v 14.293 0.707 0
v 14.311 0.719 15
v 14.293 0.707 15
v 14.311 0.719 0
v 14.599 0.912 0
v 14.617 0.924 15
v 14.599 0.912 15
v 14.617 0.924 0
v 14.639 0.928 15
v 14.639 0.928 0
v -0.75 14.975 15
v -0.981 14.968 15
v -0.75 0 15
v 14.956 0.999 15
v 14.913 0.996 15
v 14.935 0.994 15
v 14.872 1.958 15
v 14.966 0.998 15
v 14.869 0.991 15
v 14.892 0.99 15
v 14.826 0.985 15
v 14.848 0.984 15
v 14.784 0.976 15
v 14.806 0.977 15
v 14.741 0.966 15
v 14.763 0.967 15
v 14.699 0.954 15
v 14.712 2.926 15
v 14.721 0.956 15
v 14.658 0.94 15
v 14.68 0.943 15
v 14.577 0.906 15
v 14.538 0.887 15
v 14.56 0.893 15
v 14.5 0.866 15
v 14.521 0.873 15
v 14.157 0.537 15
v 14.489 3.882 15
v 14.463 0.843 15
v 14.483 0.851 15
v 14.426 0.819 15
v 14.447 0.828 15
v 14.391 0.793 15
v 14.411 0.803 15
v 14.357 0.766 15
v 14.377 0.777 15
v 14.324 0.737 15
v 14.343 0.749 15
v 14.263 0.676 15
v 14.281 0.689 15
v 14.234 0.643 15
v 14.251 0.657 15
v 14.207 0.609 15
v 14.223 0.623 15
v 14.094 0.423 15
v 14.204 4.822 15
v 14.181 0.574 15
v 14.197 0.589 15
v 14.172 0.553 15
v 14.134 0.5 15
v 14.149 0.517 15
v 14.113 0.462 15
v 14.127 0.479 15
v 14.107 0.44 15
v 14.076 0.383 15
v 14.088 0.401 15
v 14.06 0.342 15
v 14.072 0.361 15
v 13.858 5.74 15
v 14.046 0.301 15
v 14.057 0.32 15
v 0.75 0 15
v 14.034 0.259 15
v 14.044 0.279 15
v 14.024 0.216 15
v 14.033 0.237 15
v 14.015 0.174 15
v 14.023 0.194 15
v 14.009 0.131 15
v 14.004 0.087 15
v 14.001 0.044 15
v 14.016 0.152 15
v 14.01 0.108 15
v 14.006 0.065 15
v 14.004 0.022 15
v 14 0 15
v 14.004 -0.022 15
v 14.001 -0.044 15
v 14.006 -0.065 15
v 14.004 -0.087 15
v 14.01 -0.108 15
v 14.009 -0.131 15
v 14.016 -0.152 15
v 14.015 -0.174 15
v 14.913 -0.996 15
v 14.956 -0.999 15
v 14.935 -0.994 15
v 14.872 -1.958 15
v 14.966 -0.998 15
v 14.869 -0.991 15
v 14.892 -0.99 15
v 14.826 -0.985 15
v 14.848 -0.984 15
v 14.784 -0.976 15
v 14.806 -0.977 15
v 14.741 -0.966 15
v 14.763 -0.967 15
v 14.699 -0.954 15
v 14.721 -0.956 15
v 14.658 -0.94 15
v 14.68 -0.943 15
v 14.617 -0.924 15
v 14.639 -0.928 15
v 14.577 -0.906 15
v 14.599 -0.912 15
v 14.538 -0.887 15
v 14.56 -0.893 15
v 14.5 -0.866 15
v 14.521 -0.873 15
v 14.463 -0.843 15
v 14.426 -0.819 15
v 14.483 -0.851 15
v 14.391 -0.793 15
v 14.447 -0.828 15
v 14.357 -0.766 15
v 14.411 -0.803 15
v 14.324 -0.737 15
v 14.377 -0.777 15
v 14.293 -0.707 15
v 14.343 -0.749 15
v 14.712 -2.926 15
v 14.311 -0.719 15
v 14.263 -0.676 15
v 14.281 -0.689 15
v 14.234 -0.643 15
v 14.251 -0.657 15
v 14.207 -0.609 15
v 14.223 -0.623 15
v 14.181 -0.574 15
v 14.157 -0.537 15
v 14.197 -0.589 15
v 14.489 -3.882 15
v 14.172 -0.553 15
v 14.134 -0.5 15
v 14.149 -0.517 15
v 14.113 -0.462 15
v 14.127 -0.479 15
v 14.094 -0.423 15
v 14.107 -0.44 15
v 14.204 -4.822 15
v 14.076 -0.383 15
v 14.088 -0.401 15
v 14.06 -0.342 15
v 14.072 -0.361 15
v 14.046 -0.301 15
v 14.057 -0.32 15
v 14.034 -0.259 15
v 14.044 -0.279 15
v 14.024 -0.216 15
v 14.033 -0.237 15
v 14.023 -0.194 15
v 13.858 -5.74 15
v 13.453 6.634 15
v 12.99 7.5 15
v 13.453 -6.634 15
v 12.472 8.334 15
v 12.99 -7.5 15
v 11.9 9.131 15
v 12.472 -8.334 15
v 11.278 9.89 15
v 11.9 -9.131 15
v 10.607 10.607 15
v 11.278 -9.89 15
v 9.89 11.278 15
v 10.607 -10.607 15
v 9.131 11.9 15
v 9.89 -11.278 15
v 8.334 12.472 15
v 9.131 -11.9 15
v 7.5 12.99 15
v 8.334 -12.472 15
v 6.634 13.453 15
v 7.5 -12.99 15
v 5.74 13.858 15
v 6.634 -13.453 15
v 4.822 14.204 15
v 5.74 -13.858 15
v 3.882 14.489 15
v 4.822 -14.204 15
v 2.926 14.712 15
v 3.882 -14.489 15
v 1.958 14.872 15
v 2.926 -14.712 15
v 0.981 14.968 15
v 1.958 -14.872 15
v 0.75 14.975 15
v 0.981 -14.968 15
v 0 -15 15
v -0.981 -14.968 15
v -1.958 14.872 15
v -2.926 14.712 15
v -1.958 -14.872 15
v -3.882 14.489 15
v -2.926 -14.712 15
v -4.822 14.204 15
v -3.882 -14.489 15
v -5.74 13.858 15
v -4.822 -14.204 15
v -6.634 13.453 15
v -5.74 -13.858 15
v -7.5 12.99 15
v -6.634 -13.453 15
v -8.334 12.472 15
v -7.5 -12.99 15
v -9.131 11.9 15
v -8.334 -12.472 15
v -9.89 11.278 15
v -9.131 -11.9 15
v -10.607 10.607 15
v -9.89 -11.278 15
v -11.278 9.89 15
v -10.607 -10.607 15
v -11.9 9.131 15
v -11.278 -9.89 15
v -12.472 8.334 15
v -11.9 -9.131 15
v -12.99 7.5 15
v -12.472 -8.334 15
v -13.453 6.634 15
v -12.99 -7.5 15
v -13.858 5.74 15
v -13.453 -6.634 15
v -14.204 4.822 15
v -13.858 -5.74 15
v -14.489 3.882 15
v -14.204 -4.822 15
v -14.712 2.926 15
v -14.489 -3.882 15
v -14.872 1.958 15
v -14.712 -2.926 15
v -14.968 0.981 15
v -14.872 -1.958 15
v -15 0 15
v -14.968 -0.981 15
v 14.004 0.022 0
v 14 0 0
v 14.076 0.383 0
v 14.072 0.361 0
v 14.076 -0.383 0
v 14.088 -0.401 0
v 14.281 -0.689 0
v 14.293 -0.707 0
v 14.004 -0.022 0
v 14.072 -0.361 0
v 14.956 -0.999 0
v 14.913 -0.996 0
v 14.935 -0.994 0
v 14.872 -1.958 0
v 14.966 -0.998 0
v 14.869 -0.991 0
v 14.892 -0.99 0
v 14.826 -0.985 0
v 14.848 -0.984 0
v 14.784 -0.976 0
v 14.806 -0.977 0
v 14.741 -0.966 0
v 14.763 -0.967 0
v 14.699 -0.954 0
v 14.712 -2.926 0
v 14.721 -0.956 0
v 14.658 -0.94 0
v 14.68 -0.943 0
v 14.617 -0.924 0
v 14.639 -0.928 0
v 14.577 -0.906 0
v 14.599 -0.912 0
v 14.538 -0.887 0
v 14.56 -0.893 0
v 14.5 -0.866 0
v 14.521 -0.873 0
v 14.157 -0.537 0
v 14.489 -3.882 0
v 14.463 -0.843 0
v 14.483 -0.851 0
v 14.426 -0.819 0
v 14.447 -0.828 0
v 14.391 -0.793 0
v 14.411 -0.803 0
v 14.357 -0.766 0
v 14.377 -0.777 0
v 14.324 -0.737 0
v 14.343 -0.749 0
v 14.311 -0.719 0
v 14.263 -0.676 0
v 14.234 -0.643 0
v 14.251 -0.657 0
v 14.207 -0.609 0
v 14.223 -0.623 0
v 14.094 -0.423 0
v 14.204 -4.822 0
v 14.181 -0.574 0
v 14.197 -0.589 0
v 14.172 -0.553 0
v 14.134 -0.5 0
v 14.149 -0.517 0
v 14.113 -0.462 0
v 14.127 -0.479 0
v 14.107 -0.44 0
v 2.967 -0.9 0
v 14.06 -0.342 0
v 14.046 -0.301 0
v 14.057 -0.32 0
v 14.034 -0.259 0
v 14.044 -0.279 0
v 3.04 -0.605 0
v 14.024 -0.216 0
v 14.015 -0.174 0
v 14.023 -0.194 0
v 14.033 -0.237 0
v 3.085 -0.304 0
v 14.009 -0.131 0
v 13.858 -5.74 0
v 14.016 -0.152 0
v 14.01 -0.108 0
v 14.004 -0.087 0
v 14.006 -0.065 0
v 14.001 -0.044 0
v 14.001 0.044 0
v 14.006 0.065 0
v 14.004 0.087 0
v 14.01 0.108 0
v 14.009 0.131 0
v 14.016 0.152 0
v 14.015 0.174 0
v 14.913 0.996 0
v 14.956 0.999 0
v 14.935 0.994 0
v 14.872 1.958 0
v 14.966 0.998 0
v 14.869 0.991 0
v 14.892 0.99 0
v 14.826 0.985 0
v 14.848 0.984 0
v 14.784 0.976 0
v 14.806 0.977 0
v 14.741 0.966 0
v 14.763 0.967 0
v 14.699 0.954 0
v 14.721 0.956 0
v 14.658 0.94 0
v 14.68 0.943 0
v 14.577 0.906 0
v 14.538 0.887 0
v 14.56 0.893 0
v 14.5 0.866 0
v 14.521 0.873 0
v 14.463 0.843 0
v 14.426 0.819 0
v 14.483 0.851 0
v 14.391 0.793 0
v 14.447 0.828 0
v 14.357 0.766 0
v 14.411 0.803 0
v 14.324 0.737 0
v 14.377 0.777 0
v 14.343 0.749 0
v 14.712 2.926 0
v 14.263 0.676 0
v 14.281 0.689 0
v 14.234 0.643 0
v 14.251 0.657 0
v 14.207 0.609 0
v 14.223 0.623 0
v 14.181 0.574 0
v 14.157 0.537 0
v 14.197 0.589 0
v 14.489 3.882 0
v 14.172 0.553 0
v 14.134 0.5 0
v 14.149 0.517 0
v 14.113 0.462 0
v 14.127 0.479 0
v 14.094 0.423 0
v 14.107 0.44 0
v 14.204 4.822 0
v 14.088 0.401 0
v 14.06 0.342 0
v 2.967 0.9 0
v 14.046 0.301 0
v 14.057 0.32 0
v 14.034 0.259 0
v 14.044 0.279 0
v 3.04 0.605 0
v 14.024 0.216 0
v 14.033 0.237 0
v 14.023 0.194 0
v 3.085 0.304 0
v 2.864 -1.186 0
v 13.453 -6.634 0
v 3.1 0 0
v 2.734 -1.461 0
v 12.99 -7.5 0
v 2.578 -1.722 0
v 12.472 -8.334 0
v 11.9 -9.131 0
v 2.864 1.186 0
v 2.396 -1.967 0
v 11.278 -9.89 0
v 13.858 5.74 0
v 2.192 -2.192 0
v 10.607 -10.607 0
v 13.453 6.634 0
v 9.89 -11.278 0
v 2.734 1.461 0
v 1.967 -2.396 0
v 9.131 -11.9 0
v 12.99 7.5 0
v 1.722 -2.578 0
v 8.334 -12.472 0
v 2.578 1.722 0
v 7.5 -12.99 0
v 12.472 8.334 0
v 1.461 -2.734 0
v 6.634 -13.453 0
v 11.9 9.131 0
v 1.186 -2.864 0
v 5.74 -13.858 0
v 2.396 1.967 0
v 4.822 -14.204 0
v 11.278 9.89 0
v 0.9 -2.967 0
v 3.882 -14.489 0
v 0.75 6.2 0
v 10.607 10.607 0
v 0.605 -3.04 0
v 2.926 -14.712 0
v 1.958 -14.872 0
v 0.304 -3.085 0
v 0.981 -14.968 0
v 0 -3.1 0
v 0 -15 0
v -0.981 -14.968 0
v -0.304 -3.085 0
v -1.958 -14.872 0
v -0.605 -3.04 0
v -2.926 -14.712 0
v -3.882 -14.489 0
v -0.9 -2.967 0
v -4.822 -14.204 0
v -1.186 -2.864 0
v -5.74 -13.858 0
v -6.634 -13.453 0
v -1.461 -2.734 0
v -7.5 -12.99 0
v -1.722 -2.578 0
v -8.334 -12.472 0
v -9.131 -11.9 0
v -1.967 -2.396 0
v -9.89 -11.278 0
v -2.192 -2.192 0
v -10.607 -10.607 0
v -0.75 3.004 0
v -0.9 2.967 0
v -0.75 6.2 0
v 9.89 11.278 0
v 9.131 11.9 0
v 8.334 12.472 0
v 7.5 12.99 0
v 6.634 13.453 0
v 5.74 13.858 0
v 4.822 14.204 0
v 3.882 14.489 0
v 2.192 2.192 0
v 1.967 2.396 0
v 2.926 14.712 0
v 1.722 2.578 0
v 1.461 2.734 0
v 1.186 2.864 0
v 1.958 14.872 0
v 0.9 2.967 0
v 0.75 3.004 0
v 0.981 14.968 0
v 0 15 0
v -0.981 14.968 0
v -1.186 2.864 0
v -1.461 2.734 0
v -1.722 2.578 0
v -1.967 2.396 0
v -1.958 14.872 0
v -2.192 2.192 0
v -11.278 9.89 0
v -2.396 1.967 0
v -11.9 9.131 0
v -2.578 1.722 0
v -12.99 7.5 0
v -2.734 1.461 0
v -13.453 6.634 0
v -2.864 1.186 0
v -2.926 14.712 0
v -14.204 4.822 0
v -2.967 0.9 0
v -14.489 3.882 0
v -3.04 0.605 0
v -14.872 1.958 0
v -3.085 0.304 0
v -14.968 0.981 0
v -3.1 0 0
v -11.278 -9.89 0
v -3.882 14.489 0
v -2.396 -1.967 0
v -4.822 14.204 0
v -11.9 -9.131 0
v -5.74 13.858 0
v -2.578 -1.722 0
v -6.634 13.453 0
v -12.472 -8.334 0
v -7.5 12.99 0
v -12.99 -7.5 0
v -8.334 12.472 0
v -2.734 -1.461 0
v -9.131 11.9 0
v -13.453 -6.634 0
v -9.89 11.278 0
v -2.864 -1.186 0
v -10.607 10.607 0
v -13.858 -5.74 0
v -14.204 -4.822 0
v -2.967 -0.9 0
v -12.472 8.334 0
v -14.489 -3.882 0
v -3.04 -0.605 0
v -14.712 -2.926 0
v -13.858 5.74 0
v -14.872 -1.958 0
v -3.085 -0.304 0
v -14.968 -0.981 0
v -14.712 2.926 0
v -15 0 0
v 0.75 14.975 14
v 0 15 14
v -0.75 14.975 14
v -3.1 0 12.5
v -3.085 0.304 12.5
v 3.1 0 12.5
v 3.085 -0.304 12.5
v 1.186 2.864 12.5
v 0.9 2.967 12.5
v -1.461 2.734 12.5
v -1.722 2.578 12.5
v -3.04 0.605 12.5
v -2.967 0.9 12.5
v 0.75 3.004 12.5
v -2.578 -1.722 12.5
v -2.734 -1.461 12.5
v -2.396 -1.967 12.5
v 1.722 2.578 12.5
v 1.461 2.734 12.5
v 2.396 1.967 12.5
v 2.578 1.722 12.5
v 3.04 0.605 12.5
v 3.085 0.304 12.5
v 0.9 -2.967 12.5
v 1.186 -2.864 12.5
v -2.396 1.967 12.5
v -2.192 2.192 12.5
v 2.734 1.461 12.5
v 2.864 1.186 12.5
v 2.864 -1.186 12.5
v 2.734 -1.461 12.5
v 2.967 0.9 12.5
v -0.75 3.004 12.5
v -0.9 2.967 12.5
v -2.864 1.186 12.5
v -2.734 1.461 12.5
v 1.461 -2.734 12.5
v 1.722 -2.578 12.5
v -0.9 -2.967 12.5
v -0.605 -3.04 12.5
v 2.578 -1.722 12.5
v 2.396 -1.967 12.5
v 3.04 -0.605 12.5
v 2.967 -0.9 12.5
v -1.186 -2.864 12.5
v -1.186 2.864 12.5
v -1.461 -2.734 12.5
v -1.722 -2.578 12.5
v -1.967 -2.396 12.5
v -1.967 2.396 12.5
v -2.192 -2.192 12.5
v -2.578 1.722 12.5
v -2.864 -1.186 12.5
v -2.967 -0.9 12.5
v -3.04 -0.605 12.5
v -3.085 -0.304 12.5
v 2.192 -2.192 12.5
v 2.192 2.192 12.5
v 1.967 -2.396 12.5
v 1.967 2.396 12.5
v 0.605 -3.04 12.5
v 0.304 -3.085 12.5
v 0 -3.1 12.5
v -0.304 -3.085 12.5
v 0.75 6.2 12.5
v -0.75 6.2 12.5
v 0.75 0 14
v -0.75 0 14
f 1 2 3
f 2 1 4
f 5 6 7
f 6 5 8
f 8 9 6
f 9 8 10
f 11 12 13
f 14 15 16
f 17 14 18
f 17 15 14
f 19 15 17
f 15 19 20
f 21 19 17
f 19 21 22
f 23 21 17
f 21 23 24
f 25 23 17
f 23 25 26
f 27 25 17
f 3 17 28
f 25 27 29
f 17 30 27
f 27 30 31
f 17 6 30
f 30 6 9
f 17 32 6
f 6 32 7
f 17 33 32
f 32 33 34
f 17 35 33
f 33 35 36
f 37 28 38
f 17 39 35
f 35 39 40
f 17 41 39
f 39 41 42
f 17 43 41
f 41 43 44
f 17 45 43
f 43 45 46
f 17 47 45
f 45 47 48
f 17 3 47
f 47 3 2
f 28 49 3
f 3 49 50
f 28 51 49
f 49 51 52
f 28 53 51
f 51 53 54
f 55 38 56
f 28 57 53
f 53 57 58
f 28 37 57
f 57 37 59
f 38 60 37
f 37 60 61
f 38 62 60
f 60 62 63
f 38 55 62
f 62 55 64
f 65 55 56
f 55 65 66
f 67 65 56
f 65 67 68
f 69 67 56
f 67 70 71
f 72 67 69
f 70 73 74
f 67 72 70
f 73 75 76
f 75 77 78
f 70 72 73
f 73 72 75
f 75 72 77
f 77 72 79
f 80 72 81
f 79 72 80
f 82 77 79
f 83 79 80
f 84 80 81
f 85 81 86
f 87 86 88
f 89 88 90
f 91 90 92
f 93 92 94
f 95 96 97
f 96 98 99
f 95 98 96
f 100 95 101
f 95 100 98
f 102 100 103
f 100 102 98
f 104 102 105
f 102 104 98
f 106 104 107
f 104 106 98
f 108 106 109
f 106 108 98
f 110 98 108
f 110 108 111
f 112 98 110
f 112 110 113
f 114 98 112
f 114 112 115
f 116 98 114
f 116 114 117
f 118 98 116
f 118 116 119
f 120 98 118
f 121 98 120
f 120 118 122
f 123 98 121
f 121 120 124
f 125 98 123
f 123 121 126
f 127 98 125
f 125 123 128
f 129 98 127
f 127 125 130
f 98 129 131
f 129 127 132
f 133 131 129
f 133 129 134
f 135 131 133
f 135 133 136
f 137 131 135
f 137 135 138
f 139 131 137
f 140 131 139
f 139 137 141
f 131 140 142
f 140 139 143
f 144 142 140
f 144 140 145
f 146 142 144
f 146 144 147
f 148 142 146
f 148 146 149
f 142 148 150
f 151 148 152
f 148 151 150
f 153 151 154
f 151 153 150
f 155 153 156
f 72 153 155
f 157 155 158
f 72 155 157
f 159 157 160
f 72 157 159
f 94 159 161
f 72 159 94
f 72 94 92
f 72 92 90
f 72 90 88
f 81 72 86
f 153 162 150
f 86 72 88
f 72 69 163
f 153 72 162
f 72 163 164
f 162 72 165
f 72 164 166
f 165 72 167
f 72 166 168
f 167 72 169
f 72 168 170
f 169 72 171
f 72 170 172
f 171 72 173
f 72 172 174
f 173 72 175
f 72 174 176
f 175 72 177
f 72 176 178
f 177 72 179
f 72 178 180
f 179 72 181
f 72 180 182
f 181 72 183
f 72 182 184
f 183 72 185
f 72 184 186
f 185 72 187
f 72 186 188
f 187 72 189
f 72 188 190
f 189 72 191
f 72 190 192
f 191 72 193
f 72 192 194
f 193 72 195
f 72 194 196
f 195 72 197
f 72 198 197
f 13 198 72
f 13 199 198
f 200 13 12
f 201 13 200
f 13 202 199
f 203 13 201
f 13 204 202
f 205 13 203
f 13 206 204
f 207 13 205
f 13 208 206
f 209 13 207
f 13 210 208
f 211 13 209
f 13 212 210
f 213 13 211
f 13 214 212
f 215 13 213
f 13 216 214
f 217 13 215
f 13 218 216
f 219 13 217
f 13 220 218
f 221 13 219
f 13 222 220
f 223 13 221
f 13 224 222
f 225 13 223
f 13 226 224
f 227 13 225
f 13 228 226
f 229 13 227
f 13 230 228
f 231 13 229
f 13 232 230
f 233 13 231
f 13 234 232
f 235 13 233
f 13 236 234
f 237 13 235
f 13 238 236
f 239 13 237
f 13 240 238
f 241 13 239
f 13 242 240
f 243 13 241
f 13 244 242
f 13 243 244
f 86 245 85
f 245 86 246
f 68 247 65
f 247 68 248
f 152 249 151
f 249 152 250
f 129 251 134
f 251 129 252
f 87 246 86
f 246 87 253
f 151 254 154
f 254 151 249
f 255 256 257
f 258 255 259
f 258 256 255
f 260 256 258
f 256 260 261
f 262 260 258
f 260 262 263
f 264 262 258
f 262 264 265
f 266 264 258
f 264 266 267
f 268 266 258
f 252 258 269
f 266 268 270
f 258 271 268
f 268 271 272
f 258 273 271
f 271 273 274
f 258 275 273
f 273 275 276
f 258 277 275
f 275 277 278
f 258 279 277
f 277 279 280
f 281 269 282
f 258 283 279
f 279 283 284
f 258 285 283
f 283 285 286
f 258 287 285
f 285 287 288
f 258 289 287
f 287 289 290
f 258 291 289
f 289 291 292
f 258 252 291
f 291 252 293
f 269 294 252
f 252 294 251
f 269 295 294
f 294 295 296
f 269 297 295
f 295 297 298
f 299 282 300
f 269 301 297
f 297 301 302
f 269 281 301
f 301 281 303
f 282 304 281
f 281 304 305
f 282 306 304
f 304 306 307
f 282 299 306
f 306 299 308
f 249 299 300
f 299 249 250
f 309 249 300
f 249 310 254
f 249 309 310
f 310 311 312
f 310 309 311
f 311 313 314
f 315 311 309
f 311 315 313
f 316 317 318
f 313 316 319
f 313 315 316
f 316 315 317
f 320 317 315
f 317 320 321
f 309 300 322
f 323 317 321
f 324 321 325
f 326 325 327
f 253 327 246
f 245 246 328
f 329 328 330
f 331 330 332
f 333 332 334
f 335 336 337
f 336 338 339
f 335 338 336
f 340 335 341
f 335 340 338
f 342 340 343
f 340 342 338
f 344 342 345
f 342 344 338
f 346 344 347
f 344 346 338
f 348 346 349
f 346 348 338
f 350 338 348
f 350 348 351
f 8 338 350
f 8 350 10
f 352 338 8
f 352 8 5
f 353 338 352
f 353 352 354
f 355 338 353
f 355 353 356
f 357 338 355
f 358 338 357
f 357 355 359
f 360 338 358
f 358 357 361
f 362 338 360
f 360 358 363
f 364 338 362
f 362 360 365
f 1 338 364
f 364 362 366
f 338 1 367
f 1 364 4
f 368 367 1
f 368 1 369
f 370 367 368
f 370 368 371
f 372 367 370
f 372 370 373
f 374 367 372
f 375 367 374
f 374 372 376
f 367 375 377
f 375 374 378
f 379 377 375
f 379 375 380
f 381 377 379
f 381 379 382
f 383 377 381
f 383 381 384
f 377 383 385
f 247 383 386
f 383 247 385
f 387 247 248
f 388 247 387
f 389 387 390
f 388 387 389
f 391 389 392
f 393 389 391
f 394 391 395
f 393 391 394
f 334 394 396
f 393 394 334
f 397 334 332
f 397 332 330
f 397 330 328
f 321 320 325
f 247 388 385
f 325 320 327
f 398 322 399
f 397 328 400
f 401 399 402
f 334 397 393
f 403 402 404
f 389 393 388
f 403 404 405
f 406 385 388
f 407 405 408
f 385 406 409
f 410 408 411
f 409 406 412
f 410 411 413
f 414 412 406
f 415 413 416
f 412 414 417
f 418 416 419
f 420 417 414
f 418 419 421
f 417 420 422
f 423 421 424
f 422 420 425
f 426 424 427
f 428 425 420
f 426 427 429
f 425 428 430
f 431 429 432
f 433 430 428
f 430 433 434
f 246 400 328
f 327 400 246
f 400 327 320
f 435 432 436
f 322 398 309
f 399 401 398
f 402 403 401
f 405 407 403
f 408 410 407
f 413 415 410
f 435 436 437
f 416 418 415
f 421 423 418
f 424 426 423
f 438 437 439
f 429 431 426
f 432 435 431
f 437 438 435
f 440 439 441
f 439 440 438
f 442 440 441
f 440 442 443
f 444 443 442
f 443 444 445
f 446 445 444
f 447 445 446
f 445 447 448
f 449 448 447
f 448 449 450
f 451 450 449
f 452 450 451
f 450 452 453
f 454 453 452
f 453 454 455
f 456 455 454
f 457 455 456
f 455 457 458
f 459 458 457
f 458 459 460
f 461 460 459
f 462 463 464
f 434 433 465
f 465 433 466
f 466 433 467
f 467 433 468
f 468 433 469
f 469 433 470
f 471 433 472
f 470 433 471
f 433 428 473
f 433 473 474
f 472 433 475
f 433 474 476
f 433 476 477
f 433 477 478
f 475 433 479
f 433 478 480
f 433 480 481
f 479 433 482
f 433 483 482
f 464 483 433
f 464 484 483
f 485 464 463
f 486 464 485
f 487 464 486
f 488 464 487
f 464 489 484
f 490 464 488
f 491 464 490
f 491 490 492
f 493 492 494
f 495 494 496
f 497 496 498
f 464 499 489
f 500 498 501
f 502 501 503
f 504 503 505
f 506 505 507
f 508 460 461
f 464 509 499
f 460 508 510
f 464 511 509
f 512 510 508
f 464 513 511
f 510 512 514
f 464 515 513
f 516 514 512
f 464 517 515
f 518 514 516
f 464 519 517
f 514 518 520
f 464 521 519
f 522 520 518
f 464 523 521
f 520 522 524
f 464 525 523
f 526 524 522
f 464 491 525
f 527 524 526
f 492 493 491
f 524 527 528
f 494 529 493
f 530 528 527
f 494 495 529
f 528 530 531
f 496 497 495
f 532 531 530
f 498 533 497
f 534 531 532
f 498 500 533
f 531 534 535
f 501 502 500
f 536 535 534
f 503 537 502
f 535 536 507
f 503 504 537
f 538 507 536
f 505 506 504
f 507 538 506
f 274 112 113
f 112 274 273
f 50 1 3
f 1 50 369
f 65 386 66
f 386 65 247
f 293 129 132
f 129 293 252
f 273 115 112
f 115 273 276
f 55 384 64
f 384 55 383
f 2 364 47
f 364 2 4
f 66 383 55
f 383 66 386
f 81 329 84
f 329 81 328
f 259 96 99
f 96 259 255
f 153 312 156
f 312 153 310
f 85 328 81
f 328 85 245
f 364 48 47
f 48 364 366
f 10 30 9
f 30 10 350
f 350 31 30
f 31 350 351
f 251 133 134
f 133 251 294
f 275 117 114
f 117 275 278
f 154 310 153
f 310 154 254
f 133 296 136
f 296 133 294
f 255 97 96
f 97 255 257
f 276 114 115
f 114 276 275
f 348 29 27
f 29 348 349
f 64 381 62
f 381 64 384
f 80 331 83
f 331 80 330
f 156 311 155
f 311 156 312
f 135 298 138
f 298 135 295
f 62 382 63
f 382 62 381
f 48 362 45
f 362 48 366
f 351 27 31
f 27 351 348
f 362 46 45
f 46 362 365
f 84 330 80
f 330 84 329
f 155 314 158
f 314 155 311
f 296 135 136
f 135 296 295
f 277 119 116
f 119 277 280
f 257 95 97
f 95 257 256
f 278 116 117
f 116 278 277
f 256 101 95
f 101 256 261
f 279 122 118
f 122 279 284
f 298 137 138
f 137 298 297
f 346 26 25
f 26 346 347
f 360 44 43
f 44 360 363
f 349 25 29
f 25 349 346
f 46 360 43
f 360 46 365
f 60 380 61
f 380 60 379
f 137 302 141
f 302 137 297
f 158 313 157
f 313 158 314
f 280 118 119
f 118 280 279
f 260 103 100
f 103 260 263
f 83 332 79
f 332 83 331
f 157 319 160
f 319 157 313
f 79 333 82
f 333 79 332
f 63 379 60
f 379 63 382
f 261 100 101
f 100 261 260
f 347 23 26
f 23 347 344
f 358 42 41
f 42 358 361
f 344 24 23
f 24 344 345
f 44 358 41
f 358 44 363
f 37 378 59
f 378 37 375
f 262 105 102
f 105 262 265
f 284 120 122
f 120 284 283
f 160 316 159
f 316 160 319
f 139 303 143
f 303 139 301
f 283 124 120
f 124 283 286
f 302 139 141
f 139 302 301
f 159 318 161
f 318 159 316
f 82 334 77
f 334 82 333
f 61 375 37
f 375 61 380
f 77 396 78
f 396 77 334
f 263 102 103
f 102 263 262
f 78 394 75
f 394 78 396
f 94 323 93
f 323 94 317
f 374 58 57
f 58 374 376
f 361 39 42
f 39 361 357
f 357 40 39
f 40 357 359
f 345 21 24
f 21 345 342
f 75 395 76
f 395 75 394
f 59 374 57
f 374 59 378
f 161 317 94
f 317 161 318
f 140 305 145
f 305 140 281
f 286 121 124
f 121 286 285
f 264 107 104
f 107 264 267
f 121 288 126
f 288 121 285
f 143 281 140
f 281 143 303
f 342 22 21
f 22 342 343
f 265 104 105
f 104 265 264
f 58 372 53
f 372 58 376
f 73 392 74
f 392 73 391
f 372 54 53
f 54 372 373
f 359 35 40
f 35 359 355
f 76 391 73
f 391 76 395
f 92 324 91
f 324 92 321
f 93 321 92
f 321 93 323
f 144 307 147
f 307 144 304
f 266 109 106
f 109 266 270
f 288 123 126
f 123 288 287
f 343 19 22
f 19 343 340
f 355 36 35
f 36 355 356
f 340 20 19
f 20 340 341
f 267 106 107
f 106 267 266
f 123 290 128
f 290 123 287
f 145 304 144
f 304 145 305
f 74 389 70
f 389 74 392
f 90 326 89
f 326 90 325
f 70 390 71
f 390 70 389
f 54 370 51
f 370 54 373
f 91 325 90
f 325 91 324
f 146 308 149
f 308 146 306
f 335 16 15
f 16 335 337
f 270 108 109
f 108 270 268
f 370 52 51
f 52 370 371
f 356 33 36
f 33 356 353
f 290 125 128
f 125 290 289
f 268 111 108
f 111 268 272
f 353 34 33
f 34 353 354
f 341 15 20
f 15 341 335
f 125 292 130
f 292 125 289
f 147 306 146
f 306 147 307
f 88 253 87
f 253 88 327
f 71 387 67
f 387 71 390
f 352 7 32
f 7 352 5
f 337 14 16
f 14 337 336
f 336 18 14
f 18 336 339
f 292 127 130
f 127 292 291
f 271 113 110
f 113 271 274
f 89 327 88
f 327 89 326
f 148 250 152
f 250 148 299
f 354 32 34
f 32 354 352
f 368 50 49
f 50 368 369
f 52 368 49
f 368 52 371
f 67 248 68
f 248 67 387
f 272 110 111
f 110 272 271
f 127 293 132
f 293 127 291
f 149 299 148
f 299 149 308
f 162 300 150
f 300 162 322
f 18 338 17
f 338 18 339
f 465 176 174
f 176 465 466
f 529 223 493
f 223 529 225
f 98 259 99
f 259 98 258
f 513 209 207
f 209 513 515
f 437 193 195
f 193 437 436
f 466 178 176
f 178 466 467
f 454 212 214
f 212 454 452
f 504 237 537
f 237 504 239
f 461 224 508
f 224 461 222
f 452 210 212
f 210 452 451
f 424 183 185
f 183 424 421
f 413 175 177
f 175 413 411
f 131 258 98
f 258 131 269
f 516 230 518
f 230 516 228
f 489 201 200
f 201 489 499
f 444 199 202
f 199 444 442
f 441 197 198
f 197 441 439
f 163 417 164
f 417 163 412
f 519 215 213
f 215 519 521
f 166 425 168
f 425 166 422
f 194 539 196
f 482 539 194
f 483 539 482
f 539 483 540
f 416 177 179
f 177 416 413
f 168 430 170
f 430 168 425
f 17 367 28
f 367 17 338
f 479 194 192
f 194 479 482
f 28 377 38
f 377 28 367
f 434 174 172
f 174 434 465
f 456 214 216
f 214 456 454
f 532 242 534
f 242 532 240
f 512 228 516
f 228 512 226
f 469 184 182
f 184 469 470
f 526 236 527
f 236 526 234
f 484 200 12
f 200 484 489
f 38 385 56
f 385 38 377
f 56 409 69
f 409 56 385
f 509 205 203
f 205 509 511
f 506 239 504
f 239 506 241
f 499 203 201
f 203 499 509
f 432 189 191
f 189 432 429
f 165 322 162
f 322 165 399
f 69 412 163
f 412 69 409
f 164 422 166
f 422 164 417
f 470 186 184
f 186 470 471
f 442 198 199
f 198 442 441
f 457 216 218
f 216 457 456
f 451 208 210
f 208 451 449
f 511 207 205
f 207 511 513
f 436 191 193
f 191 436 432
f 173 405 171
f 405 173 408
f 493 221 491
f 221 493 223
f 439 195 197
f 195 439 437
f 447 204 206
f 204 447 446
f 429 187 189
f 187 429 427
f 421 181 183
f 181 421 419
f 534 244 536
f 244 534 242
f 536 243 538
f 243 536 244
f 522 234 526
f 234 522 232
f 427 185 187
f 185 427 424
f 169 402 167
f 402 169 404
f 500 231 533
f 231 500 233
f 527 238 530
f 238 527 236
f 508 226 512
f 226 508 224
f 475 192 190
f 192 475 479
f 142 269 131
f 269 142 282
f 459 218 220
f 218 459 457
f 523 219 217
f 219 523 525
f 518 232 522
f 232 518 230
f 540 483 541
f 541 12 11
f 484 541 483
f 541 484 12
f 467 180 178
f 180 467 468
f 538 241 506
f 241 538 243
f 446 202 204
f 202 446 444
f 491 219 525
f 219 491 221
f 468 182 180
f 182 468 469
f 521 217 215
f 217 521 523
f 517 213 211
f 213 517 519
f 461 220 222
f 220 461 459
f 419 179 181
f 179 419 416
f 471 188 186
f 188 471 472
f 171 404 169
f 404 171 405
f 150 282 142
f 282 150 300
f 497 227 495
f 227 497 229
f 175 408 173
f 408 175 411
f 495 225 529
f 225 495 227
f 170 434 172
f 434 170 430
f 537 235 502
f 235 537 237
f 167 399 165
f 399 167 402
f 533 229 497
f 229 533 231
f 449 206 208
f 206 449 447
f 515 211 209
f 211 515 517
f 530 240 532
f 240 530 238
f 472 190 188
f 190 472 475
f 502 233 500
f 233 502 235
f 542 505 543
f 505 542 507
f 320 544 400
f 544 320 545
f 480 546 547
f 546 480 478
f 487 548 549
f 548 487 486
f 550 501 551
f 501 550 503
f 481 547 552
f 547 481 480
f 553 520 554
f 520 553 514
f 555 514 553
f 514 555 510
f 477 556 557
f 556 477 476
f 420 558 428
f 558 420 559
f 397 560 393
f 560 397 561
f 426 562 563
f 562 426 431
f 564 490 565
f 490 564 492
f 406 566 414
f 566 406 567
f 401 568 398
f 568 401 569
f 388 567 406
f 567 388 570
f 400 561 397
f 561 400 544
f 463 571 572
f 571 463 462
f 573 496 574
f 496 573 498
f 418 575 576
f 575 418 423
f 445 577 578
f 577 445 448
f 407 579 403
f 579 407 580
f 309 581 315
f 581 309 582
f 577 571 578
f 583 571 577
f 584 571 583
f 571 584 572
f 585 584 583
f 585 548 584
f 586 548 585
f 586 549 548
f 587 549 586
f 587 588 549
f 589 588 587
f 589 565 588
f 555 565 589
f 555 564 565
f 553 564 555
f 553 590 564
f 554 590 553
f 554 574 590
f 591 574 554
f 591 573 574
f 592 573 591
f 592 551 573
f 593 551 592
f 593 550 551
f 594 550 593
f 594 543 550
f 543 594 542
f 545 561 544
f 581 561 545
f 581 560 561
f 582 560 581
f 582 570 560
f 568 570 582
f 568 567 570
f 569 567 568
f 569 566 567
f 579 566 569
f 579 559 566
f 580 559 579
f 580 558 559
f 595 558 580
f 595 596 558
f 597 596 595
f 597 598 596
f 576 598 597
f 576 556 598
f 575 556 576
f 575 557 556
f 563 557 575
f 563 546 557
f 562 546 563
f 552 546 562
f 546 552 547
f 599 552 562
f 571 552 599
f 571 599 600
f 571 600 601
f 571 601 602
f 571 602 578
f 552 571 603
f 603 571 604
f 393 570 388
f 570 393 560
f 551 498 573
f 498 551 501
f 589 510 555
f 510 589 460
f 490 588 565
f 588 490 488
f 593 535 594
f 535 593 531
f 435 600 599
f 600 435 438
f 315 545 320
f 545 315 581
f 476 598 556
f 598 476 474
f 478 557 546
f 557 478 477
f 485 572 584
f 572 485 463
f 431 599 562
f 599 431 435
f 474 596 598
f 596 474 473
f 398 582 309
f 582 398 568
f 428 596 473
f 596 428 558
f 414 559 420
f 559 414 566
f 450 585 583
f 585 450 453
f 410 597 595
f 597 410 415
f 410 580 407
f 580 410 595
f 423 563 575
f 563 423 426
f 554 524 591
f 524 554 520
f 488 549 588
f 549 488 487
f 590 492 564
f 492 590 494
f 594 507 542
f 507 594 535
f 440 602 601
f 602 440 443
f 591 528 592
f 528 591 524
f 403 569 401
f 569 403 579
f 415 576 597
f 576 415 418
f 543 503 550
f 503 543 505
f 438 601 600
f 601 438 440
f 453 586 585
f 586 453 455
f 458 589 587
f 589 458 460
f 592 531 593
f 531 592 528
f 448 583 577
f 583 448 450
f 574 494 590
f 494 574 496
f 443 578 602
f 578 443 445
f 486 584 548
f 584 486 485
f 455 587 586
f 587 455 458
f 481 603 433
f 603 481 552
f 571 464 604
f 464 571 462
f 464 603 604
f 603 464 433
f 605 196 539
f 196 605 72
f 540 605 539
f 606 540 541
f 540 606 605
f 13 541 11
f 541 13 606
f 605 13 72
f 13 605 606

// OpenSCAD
// Replacement knob for hotplate stirrer with D-shaft
// Print orientation: side facing hotplate down on bed (z = 0)

// ---------------- Parameters ----------------
knob_d        = 30;    // knob outer diameter
knob_h        = 15;    // knob height
shaft_d       = 6;     // D-shaft diameter
bore_depth    = 12;    // blind bore depth from bottom face
bore_flat     = 4.7;   // distance from D-bore flat to opposite side
bore_r        = 3.1;   // bore radius (6.2 mm diameter)
groove_count  = 18;    // number of vertical grip grooves
groove_d      = 2;     // groove diameter (half-cylinder)
pointer_w     = 1.5;   // pointer groove width
pointer_d     = 1;     // pointer groove depth

eps           = 0.5;   // cutter overshoot past faces
$fn           = 96;    // curve resolution

// ---------------- Model ----------------
difference() {
    // Main cylinder
    cylinder(d = knob_d, h = knob_h);

    // D-shaped blind bore from bottom face
    translate([0, 0, -eps])
        cylinder(r = bore_r, h = bore_depth + 2 * eps, $fn = 64);

    // Flat on D-bore, cut from bottom face
    translate([-(6.2 - bore_flat) / 2, 0, -eps])
        cube([6.2 - bore_flat, 6.2, bore_depth + 2 * eps]);

    // Vertical grip grooves along full height
    for (i = [0 : groove_count - 1]) {
        a = i * 360 / groove_count;
        translate([knob_d / 2, 0, 0])
            rotate([0, 0, a])
                cylinder(d = groove_d, h = knob_h, $fn = 16);
    }

    // Pointer groove on top face, same side as D-bore flat
    translate([-(6.2 - bore_flat) / 2, 0, knob_h - pointer_d])
        cube([pointer_w, knob_d, pointer_d + eps]);
}
